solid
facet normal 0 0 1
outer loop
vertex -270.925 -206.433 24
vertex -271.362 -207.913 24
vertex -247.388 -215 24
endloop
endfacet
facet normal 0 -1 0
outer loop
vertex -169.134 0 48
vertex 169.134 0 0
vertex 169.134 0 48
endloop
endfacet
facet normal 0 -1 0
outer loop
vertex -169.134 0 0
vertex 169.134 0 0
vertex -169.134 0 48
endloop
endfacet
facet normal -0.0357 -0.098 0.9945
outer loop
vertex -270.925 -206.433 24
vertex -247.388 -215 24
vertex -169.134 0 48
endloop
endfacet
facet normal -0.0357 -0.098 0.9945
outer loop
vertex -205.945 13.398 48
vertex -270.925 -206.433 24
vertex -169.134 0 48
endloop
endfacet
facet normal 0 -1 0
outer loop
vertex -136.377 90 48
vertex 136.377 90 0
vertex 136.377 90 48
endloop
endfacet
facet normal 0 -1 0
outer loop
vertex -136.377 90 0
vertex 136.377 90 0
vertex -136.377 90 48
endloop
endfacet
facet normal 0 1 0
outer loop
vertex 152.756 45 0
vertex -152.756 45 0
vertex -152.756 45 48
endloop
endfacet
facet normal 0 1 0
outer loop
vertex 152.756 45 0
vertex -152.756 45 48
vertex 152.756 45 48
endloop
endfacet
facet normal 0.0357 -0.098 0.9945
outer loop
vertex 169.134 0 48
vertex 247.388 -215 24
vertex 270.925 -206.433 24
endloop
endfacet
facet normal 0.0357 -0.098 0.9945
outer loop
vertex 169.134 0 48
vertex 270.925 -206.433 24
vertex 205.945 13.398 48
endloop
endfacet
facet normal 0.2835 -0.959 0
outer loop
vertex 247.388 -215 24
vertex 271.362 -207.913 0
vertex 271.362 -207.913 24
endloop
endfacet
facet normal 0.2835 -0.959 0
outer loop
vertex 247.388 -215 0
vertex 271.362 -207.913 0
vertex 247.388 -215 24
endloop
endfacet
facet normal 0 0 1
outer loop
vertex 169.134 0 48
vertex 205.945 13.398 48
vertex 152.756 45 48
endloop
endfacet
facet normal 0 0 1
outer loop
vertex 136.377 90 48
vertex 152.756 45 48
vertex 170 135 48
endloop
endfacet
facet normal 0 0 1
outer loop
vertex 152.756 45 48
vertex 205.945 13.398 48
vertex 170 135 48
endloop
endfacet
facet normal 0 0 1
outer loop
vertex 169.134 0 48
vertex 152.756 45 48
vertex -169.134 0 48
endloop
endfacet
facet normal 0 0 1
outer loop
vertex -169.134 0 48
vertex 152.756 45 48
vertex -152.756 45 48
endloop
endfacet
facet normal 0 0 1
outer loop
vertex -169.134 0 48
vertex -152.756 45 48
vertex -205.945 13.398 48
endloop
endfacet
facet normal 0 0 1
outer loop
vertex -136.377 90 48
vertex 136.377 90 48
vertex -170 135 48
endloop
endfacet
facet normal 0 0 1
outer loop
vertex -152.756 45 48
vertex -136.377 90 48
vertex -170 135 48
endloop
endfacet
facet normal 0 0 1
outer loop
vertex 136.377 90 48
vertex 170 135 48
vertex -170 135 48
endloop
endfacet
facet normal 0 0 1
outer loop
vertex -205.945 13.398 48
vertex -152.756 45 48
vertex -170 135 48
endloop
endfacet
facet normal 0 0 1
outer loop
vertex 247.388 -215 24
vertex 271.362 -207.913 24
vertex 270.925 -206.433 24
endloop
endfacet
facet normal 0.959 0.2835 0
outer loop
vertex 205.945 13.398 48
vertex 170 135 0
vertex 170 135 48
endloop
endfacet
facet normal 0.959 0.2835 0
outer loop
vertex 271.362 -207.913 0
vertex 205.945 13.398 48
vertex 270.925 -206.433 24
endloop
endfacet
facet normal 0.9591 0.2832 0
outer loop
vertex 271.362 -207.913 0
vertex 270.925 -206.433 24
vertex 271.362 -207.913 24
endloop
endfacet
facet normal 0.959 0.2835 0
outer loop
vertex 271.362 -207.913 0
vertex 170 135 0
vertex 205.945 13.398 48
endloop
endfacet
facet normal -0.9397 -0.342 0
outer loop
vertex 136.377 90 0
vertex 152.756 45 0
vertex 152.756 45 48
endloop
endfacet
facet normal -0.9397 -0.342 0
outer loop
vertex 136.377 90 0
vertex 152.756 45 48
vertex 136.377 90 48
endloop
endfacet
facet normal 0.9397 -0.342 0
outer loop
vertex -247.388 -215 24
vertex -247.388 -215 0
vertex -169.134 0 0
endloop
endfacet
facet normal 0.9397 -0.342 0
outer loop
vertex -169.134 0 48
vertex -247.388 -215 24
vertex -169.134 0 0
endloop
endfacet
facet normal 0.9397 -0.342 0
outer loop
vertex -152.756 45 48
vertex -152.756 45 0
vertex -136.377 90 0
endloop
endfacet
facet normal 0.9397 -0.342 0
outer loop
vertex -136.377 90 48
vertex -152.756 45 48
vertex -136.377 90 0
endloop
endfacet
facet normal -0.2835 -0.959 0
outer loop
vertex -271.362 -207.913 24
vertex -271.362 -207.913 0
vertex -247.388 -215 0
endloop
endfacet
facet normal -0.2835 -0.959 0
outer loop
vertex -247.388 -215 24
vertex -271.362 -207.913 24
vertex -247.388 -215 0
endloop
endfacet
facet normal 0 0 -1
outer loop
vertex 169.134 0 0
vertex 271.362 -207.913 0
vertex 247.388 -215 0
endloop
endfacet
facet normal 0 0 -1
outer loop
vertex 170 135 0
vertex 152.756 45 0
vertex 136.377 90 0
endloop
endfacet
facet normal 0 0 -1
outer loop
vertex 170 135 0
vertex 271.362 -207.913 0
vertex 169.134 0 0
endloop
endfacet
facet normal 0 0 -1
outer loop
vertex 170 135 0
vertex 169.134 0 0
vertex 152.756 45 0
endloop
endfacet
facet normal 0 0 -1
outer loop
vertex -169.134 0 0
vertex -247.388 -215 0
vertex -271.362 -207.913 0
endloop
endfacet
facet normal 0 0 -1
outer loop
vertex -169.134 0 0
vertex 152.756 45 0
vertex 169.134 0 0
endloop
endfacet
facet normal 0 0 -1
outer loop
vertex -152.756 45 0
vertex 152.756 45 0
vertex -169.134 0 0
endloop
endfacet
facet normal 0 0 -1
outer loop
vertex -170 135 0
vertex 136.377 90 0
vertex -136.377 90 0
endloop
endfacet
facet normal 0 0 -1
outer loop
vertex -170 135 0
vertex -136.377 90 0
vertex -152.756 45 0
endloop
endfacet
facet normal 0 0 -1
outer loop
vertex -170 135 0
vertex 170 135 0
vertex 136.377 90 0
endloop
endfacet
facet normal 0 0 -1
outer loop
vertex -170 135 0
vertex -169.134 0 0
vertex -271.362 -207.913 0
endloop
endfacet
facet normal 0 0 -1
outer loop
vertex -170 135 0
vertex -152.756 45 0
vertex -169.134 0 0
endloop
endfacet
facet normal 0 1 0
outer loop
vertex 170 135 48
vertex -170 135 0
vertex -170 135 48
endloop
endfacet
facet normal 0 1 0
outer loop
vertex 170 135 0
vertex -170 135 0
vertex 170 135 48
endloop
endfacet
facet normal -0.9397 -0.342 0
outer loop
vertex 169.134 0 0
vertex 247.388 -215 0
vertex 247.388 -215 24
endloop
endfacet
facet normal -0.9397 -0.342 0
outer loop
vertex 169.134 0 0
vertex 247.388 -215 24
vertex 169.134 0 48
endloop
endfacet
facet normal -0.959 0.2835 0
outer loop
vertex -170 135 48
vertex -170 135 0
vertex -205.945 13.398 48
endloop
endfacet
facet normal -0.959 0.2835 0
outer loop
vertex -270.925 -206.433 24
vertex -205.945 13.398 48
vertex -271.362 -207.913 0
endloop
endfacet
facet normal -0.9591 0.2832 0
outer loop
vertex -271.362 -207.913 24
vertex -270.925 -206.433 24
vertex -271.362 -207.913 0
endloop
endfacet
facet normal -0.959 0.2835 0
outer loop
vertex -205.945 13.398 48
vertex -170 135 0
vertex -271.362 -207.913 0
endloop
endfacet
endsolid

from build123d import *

# Parameters (mm, degrees)
F1_DEPTH = 48
F3_DEPTH = 142.236757


with BuildPart() as f1:
    # F0 (on Top) → F1 (new body)
    with BuildSketch(Plane.XY):
        Polygon((0, 45), (-152.755526, 45), (-169.134186, 0), (0, 0), align=None)
        Polygon((0, 90), (0, 135), (-170, 135), (-271.362335, -207.913322), (-247.387787, -215), (-169.134186, 0), (-152.755526, 45), (-136.376865, 90), align=None)
    extrude(amount=F1_DEPTH)

    # F2 (on face) → F3 (cut, through all)
    with BuildSketch(Plane(origin=(-149.349245, 54.35868, 0), x_dir=(0.34202, 0.939693, 0), z_dir=(0.939693, -0.34202, 0))):
        Polygon((-286.64552, 24), (-57.847299, 48), (-286.64552, 48), align=None)
        Polygon((-306.842566, 24), (-286.64552, 24), (-286.64552, 48), (-315.660655, 48), align=None)
    extrude(amount=-F3_DEPTH, mode=Mode.SUBTRACT)

    # F4: F1 across plane


with BuildPart() as f1_1:
    add(f1.part)
    add(f1.part.mirror(Plane.YZ))


solid = f1_1.part
